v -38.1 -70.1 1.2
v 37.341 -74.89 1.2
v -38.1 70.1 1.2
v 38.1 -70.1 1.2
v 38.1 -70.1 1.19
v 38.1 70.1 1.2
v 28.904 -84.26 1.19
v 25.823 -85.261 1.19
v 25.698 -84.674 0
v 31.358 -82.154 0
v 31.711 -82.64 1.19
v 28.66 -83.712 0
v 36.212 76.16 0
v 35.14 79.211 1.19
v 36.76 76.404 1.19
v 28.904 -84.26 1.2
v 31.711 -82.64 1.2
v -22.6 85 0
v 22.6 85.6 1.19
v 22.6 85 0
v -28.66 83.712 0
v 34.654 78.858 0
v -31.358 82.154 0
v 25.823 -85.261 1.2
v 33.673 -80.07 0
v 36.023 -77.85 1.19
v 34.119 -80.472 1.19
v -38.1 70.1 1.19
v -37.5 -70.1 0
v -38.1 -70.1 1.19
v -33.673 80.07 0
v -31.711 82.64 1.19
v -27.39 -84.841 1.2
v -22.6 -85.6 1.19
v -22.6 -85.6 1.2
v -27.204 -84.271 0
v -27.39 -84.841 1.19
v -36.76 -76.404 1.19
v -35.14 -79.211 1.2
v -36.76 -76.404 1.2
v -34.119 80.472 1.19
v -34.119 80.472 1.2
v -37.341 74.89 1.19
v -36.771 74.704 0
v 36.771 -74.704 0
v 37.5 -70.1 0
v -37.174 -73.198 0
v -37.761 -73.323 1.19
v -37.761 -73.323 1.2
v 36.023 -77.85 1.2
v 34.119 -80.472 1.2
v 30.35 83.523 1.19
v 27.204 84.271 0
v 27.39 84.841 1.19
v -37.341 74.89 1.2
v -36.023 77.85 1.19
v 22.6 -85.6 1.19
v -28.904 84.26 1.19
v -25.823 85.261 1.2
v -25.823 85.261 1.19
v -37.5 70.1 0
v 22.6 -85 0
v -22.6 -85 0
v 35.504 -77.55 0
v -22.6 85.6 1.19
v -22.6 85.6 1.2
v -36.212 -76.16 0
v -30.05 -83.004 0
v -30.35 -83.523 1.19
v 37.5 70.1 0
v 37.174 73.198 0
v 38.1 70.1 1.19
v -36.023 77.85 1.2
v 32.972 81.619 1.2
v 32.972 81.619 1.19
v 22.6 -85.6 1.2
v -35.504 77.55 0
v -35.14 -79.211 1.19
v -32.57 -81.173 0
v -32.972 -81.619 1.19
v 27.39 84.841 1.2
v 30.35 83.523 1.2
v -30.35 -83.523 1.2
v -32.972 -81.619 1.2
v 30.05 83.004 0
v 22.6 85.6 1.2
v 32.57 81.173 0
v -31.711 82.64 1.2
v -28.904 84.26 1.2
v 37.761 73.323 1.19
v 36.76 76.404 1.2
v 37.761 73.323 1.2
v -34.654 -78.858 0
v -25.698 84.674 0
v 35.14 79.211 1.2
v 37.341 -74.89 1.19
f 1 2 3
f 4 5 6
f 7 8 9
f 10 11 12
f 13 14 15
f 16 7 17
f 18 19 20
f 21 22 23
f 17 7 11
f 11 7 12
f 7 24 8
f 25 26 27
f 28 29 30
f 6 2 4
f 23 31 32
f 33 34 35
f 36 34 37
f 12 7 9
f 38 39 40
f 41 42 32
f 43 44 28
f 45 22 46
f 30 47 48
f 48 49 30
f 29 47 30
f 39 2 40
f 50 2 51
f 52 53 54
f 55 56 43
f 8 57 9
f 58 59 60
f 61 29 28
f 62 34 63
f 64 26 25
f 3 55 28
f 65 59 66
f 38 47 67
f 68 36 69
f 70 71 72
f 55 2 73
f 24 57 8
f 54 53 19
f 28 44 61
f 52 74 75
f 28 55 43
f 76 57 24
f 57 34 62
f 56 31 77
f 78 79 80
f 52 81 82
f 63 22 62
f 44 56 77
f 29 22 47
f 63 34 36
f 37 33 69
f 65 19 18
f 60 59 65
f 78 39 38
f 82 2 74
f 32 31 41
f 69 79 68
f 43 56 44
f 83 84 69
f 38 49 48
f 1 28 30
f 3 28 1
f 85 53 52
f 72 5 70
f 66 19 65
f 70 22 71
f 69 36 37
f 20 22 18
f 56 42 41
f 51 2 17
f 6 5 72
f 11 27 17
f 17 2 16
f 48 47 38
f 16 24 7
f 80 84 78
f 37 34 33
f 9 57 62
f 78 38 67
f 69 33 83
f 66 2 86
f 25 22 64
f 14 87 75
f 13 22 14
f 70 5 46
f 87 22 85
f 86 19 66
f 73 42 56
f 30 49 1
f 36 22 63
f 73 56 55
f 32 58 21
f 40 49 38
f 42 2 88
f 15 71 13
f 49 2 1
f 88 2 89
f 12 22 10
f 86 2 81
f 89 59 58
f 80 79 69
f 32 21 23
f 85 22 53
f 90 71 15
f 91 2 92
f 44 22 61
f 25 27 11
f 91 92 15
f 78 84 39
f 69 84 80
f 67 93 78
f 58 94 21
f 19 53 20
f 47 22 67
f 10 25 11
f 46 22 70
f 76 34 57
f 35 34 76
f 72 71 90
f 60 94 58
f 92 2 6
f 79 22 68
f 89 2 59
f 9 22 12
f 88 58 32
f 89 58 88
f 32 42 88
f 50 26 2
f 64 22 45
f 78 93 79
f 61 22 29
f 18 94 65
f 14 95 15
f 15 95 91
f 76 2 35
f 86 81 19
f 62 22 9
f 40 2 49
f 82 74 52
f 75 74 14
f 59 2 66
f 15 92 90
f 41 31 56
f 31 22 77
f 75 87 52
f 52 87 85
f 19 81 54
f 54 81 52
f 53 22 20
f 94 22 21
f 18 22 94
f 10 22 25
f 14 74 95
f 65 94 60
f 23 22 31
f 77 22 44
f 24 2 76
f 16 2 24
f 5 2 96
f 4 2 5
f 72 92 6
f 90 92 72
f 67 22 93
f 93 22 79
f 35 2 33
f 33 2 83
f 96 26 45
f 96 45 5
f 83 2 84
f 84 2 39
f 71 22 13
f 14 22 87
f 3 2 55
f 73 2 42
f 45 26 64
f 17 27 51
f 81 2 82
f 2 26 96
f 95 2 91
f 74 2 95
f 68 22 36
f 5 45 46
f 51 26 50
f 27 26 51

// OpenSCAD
// Semelle antiderapante TPU (une par pied, la meme pour les deux : forme symetrique)
// Dessous plat de la semelle du modele SundayA1_short_new : 79,2 x 174,2 mm, coins r 17.
// Retrait de 1,5 mm par cote, chanfrein de 0,6 mm cote sol pour ne pas accrocher.
W = 76.2; L = 171.2; R = 15.5; H = 1.2; CH = 0.6;
module rr(w, l, r, h) { linear_extrude(h) offset(r) square([w - 2*r, l - 2*r], center = true); }
hull() { rr(W - 2*CH, L - 2*CH, R - CH, 0.01); translate([0, 0, H - 0.01]) rr(W, L, R, 0.01); }
